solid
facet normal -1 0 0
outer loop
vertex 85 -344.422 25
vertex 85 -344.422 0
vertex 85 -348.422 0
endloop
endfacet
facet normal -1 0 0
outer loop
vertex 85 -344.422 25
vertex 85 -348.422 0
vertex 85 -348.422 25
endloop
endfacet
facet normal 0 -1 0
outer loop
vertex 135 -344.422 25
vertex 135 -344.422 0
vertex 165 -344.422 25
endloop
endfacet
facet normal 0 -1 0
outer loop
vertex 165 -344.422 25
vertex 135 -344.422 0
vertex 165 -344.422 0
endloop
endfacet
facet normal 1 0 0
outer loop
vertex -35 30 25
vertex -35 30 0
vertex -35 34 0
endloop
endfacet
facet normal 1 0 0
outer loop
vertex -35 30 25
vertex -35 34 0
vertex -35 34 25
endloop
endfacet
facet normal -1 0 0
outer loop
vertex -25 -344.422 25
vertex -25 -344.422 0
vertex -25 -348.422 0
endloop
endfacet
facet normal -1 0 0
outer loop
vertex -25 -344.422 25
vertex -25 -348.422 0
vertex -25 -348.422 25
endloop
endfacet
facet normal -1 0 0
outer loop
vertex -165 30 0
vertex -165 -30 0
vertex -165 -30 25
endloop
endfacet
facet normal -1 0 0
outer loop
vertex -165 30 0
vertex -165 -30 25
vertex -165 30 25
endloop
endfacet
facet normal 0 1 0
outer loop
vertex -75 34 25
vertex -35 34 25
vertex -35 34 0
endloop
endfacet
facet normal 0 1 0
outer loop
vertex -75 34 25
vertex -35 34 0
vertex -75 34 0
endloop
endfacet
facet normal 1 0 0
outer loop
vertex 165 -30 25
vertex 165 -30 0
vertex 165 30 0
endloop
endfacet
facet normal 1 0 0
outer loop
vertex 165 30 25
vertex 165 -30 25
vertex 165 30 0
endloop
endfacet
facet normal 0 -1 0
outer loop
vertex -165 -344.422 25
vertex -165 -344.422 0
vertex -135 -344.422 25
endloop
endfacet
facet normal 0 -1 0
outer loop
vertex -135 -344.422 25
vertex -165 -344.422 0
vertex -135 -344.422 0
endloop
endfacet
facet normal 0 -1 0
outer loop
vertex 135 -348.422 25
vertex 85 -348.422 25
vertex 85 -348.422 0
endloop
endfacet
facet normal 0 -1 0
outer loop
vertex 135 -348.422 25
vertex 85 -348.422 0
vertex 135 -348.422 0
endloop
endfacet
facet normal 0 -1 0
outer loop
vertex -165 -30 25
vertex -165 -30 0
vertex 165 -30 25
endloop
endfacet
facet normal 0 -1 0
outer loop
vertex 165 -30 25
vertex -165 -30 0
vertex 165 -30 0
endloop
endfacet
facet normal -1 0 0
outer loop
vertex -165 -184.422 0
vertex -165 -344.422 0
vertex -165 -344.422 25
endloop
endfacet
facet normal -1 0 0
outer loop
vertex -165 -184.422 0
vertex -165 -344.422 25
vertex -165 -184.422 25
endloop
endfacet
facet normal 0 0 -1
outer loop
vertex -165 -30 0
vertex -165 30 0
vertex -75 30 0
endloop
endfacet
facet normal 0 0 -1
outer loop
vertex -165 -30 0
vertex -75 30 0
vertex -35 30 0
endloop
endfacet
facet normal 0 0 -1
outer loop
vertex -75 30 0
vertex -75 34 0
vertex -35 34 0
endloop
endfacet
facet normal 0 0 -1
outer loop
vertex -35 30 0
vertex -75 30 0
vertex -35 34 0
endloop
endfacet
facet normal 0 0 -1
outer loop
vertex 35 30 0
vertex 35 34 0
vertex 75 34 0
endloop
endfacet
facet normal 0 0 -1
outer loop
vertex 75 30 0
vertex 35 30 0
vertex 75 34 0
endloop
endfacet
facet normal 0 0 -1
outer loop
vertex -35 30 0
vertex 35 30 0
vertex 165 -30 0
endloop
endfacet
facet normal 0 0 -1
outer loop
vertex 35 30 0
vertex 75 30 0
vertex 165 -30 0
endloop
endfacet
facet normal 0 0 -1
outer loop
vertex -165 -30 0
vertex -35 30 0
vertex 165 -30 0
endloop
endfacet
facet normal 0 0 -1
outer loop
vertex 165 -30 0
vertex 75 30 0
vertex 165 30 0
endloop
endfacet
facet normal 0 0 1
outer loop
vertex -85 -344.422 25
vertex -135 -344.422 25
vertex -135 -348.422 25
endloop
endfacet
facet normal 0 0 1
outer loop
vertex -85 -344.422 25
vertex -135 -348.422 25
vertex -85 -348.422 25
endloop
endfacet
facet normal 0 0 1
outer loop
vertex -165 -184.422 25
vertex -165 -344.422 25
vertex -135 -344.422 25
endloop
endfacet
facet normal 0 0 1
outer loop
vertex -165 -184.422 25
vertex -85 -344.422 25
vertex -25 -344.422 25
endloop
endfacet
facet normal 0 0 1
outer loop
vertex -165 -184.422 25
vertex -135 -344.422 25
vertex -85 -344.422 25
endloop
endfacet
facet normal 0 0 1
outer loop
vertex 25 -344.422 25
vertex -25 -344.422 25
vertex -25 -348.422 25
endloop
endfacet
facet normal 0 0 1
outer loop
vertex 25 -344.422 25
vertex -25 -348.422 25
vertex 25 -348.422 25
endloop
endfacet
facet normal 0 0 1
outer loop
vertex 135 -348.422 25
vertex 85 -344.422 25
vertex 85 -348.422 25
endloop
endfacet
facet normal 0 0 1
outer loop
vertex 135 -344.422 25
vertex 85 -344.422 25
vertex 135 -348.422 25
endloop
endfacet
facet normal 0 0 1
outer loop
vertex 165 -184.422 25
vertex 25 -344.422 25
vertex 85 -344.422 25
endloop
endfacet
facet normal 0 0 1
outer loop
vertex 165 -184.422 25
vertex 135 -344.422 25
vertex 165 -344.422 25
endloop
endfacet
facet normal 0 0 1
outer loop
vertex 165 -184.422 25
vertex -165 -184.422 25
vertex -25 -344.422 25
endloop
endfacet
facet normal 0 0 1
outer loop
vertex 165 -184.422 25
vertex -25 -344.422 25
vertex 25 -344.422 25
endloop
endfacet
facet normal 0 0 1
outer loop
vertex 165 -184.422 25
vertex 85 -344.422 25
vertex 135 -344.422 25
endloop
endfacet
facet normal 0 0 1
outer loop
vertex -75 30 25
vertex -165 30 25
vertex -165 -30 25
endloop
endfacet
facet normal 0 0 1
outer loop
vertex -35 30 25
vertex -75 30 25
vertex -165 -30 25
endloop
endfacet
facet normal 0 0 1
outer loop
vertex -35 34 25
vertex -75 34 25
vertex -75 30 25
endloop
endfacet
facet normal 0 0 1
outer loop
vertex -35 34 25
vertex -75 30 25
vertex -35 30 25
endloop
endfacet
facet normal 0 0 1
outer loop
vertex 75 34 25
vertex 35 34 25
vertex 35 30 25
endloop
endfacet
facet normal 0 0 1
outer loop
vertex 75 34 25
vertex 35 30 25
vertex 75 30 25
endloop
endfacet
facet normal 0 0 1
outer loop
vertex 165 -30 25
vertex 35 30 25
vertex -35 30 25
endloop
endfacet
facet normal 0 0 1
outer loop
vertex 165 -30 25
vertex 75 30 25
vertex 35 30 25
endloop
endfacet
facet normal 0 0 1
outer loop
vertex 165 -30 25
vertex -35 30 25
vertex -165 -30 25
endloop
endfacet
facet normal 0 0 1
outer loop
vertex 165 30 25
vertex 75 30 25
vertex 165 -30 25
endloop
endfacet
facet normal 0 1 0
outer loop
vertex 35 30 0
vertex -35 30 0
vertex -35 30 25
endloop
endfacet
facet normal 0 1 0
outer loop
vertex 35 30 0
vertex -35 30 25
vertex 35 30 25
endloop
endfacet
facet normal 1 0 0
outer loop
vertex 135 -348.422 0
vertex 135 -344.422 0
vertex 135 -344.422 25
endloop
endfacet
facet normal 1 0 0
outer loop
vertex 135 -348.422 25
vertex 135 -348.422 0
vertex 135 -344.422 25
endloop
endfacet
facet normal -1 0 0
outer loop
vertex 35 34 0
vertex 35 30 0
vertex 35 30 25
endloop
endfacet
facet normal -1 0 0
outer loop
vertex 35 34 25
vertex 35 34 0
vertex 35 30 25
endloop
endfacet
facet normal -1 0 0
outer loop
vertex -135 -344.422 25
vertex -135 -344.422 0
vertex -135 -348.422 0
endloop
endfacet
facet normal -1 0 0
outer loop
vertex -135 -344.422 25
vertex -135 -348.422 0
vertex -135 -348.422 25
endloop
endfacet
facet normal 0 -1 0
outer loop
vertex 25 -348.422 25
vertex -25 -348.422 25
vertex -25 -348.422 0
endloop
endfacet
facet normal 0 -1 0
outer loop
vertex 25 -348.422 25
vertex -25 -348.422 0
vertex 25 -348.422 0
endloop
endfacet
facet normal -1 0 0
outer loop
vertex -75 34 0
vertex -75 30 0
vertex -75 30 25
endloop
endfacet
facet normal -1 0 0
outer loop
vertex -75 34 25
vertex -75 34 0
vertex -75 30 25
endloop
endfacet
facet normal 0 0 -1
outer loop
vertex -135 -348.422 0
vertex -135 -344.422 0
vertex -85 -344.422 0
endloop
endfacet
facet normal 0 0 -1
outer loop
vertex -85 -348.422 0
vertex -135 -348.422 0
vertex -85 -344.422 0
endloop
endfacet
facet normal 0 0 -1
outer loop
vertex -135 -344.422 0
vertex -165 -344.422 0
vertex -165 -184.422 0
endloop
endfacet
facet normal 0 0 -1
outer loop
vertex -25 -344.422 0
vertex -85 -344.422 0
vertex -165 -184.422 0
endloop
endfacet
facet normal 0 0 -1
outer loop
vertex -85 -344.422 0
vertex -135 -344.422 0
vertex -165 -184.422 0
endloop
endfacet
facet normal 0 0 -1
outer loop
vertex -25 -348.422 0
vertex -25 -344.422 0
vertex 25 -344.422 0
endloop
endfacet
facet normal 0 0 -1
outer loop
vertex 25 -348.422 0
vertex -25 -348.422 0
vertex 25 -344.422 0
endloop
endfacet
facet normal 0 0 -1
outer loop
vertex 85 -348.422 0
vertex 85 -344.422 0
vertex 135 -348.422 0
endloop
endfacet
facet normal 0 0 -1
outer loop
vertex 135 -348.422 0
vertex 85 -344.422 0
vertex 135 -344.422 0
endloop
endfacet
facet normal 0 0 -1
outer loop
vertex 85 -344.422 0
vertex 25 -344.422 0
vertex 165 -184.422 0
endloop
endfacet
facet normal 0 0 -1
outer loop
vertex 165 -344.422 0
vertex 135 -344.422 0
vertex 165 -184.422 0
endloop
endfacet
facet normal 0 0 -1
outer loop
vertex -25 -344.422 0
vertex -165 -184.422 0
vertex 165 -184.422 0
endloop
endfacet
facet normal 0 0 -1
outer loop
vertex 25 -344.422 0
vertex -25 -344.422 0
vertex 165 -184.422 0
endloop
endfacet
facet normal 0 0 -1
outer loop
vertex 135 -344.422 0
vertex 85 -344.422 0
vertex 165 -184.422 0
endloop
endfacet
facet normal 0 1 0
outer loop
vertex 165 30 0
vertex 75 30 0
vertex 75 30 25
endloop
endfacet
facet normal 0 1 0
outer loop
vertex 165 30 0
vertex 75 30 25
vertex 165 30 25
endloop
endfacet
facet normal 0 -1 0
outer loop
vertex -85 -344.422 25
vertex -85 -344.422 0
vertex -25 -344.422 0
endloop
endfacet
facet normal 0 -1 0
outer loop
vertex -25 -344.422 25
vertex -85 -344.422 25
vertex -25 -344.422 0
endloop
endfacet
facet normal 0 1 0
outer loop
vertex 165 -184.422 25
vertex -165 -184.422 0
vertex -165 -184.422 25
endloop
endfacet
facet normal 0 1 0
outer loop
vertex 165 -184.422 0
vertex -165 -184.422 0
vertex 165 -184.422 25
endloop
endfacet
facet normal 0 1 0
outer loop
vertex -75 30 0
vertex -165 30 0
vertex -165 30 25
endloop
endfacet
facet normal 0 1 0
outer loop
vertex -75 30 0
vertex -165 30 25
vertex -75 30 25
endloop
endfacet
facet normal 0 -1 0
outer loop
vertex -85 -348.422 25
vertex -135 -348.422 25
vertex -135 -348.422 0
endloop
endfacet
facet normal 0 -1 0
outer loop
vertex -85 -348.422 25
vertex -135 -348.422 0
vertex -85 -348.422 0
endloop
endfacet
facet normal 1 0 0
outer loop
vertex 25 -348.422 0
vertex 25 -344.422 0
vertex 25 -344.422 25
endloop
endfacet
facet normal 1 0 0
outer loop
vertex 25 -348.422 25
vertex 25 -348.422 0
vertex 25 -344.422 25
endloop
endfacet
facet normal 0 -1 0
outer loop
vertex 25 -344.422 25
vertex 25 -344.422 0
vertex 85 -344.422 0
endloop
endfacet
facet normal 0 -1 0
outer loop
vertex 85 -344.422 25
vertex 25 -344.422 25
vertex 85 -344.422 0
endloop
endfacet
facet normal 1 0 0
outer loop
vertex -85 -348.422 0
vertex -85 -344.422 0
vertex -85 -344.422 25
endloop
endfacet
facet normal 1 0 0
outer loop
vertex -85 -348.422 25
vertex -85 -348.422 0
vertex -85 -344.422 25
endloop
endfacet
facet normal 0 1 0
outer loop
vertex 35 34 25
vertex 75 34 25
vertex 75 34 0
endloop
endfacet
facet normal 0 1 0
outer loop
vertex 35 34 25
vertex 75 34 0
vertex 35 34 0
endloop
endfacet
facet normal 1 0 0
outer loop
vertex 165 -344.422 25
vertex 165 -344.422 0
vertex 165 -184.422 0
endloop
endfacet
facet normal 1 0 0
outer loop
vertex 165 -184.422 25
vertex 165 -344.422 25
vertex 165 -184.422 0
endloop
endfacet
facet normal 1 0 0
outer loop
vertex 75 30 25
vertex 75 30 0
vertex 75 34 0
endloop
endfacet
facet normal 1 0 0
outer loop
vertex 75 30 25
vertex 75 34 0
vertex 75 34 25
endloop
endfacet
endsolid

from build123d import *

# Parameters (mm, degrees)
F0_W     = 330
F0_H     = 60
F1_DEPTH = 25
F2_W     = 40
F2_H     = 25
F3_DEPTH = 4
F4_W     = 330
F4_H     = 160
F5_DEPTH = 25
F6_W     = 50
F6_H     = 25
F7_DEPTH = 4


with BuildPart() as f1:
    # F0 (on Top) → F1 (new body)
    with BuildSketch(Plane.XY):
        Rectangle(F0_W, F0_H)
    extrude(amount=F1_DEPTH)

    # F2 (on face) → F3 (join)
    with BuildSketch(Plane(origin=(0, 30, 0), x_dir=(-1, 0, 0), z_dir=(0, 1, 0))):
        with Locations((-55, 12.5)):
            Rectangle(F2_W, F2_H)
        with Locations((55, 12.5)):
            Rectangle(F2_W, F2_H)
    extrude(amount=F3_DEPTH)


with BuildPart() as f5:
    # F4 (on Top) → F5 (new body)
    with BuildSketch(Plane.XY):
        with Locations((0, -264.422387)):
            Rectangle(F4_W, F4_H)
    extrude(amount=F5_DEPTH)

    # F6 (on face) → F7 (join)
    with BuildSketch(Plane.XZ.offset(344.422387)):
        with Locations((-110, 12.5)):
            Rectangle(F6_W, F6_H)
        with Locations((110, 12.5)):
            Rectangle(F6_W, F6_H)
        with Locations((0, 12.5)):
            Rectangle(F6_W, F6_H)
    extrude(amount=F7_DEPTH)


solid = Compound([f1.part, f5.part])
